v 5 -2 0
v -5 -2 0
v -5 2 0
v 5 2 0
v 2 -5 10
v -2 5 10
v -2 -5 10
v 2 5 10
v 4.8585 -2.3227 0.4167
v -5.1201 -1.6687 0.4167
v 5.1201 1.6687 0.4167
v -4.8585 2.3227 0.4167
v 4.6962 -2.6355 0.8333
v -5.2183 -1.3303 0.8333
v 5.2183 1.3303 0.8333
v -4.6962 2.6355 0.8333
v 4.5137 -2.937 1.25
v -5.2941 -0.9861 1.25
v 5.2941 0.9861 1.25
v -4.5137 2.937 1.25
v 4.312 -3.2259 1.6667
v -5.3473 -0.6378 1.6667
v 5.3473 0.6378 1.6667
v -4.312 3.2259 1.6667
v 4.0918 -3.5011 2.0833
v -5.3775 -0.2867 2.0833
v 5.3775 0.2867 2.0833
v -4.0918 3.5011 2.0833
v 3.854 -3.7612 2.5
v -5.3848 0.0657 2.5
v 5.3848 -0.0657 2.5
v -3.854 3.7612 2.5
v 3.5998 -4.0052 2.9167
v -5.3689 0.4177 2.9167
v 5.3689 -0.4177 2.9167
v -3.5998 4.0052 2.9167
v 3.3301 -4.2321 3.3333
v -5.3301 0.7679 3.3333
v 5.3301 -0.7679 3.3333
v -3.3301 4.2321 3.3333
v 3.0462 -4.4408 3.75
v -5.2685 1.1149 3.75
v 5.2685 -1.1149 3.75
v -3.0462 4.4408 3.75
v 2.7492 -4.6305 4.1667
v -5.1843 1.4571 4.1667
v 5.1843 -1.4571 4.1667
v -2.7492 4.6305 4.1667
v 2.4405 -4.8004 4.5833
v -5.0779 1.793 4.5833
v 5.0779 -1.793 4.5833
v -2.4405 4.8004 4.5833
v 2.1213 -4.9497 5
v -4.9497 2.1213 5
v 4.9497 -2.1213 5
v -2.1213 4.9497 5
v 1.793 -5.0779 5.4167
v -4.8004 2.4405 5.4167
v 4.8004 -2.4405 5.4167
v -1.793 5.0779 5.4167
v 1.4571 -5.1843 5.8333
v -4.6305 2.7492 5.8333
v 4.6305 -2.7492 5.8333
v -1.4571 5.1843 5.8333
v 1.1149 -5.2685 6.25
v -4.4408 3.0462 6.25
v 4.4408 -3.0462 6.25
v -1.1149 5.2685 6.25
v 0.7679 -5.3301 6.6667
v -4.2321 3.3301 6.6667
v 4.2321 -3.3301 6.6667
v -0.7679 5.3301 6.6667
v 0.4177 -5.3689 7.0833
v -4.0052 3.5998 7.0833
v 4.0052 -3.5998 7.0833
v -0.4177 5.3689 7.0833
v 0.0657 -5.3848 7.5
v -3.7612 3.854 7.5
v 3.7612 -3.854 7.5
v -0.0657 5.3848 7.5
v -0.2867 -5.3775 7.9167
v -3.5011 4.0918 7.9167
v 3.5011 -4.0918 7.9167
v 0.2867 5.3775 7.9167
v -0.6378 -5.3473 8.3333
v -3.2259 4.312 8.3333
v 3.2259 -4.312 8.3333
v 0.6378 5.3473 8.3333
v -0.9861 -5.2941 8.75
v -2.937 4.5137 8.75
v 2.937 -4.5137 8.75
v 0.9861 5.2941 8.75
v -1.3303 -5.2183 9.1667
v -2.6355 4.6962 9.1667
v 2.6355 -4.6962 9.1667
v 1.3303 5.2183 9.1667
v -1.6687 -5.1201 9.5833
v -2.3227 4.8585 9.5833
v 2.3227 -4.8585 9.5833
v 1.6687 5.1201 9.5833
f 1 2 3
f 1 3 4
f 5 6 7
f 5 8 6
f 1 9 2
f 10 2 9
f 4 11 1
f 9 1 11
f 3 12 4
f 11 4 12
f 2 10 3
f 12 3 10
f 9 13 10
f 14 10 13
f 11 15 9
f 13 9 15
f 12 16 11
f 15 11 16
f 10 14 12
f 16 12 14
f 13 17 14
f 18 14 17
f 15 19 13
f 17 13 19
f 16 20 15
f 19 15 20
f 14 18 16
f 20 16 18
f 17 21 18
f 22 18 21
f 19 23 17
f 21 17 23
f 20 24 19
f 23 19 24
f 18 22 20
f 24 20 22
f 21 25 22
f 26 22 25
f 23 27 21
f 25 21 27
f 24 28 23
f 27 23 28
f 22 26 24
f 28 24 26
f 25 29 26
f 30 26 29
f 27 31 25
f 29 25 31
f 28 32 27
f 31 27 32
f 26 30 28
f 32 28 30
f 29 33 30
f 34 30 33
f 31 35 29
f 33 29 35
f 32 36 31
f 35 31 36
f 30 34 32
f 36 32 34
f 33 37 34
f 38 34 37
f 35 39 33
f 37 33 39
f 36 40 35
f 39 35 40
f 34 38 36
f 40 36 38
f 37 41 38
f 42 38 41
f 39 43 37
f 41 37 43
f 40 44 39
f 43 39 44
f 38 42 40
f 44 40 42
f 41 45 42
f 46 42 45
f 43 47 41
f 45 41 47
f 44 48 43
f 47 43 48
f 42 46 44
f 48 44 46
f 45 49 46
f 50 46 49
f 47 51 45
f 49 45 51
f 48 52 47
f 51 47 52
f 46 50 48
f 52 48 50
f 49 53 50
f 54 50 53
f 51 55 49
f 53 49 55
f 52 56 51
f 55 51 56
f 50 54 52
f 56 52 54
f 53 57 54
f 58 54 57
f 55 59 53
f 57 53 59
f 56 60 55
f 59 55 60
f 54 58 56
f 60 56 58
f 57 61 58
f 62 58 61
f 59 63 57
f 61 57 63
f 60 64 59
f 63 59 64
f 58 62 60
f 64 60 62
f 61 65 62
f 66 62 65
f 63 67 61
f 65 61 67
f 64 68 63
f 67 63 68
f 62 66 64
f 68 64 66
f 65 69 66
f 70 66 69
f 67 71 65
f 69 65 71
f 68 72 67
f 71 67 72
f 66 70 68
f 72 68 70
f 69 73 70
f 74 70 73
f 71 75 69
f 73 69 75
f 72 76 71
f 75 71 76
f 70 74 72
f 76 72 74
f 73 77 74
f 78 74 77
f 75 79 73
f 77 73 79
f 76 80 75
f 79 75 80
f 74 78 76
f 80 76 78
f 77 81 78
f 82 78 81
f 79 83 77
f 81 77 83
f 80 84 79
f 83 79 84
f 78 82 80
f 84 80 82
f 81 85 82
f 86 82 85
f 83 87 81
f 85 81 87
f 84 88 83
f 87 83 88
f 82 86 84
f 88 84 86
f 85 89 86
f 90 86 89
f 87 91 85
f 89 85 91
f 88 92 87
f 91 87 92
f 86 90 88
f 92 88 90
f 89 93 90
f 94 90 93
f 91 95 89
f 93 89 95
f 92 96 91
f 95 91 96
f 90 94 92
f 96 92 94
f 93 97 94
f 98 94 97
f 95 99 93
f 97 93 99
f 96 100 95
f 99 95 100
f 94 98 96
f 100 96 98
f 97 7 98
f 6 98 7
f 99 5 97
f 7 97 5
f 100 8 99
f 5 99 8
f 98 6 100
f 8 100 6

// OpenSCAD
linear_extrude(height = 10, twist = 90, slices = 24)
  square([10, 4], center = true);
